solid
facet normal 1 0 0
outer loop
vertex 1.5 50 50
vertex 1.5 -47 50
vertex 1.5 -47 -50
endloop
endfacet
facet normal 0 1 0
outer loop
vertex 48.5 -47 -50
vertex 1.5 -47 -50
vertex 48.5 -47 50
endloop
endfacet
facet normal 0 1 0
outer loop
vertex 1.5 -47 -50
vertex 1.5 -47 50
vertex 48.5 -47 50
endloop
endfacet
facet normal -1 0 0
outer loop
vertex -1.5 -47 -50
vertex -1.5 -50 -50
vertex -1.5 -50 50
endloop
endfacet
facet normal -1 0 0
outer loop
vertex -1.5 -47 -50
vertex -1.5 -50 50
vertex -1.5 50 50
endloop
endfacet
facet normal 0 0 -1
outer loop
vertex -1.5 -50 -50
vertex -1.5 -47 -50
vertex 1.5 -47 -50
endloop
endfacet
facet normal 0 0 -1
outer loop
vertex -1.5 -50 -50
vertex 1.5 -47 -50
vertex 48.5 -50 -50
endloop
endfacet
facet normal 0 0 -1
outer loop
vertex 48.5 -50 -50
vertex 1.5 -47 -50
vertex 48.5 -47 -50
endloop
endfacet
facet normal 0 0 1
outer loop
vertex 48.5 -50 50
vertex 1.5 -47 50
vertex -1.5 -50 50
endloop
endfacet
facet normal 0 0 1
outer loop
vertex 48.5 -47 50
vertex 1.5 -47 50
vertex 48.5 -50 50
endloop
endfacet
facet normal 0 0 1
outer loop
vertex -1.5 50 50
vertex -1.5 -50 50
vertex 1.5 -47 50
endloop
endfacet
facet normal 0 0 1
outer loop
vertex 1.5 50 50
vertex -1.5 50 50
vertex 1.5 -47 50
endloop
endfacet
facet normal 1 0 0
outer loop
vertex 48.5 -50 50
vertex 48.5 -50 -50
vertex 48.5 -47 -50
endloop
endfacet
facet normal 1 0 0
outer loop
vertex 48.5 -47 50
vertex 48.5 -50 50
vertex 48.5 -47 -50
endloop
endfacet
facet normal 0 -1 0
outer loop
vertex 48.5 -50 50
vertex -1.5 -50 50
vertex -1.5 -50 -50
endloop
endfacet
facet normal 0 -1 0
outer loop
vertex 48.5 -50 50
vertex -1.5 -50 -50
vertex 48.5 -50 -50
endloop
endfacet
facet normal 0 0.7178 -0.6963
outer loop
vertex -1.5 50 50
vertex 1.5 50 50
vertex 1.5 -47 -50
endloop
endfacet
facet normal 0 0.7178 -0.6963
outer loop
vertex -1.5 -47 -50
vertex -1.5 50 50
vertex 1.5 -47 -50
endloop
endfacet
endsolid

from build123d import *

# Parameters (mm, degrees)
CROQUIS1_W              = 3
CROQUIS1_H              = 100
CROQUIS1_W_2            = 47
CROQUIS1_H_2            = 3
SALIENTE_EXTRUIR1_DEPTH = 50
CORTAR_EXTRUIR1_DEPTH   = 100


with BuildPart() as part:
    # Croquis1 → Saliente-Extruir1 (new, symmetric)
    with BuildSketch(Plane.XY):
        Rectangle(CROQUIS1_W, CROQUIS1_H)
        with Locations((25, -48.5)):
            Rectangle(CROQUIS1_W_2, CROQUIS1_H_2)
    extrude(amount=SALIENTE_EXTRUIR1_DEPTH, both=True)

    # Croquis2 → Cortar-Extruir1 (cut)
    with BuildSketch(Plane(origin=(1.5, 0, 0), x_dir=(0, 0, -1), z_dir=(1, 0, 0))):
        Polygon((-50, 50), (50, -47), (50, 50), align=None)
    extrude(amount=-CORTAR_EXTRUIR1_DEPTH, mode=Mode.SUBTRACT)


solid = part.part
